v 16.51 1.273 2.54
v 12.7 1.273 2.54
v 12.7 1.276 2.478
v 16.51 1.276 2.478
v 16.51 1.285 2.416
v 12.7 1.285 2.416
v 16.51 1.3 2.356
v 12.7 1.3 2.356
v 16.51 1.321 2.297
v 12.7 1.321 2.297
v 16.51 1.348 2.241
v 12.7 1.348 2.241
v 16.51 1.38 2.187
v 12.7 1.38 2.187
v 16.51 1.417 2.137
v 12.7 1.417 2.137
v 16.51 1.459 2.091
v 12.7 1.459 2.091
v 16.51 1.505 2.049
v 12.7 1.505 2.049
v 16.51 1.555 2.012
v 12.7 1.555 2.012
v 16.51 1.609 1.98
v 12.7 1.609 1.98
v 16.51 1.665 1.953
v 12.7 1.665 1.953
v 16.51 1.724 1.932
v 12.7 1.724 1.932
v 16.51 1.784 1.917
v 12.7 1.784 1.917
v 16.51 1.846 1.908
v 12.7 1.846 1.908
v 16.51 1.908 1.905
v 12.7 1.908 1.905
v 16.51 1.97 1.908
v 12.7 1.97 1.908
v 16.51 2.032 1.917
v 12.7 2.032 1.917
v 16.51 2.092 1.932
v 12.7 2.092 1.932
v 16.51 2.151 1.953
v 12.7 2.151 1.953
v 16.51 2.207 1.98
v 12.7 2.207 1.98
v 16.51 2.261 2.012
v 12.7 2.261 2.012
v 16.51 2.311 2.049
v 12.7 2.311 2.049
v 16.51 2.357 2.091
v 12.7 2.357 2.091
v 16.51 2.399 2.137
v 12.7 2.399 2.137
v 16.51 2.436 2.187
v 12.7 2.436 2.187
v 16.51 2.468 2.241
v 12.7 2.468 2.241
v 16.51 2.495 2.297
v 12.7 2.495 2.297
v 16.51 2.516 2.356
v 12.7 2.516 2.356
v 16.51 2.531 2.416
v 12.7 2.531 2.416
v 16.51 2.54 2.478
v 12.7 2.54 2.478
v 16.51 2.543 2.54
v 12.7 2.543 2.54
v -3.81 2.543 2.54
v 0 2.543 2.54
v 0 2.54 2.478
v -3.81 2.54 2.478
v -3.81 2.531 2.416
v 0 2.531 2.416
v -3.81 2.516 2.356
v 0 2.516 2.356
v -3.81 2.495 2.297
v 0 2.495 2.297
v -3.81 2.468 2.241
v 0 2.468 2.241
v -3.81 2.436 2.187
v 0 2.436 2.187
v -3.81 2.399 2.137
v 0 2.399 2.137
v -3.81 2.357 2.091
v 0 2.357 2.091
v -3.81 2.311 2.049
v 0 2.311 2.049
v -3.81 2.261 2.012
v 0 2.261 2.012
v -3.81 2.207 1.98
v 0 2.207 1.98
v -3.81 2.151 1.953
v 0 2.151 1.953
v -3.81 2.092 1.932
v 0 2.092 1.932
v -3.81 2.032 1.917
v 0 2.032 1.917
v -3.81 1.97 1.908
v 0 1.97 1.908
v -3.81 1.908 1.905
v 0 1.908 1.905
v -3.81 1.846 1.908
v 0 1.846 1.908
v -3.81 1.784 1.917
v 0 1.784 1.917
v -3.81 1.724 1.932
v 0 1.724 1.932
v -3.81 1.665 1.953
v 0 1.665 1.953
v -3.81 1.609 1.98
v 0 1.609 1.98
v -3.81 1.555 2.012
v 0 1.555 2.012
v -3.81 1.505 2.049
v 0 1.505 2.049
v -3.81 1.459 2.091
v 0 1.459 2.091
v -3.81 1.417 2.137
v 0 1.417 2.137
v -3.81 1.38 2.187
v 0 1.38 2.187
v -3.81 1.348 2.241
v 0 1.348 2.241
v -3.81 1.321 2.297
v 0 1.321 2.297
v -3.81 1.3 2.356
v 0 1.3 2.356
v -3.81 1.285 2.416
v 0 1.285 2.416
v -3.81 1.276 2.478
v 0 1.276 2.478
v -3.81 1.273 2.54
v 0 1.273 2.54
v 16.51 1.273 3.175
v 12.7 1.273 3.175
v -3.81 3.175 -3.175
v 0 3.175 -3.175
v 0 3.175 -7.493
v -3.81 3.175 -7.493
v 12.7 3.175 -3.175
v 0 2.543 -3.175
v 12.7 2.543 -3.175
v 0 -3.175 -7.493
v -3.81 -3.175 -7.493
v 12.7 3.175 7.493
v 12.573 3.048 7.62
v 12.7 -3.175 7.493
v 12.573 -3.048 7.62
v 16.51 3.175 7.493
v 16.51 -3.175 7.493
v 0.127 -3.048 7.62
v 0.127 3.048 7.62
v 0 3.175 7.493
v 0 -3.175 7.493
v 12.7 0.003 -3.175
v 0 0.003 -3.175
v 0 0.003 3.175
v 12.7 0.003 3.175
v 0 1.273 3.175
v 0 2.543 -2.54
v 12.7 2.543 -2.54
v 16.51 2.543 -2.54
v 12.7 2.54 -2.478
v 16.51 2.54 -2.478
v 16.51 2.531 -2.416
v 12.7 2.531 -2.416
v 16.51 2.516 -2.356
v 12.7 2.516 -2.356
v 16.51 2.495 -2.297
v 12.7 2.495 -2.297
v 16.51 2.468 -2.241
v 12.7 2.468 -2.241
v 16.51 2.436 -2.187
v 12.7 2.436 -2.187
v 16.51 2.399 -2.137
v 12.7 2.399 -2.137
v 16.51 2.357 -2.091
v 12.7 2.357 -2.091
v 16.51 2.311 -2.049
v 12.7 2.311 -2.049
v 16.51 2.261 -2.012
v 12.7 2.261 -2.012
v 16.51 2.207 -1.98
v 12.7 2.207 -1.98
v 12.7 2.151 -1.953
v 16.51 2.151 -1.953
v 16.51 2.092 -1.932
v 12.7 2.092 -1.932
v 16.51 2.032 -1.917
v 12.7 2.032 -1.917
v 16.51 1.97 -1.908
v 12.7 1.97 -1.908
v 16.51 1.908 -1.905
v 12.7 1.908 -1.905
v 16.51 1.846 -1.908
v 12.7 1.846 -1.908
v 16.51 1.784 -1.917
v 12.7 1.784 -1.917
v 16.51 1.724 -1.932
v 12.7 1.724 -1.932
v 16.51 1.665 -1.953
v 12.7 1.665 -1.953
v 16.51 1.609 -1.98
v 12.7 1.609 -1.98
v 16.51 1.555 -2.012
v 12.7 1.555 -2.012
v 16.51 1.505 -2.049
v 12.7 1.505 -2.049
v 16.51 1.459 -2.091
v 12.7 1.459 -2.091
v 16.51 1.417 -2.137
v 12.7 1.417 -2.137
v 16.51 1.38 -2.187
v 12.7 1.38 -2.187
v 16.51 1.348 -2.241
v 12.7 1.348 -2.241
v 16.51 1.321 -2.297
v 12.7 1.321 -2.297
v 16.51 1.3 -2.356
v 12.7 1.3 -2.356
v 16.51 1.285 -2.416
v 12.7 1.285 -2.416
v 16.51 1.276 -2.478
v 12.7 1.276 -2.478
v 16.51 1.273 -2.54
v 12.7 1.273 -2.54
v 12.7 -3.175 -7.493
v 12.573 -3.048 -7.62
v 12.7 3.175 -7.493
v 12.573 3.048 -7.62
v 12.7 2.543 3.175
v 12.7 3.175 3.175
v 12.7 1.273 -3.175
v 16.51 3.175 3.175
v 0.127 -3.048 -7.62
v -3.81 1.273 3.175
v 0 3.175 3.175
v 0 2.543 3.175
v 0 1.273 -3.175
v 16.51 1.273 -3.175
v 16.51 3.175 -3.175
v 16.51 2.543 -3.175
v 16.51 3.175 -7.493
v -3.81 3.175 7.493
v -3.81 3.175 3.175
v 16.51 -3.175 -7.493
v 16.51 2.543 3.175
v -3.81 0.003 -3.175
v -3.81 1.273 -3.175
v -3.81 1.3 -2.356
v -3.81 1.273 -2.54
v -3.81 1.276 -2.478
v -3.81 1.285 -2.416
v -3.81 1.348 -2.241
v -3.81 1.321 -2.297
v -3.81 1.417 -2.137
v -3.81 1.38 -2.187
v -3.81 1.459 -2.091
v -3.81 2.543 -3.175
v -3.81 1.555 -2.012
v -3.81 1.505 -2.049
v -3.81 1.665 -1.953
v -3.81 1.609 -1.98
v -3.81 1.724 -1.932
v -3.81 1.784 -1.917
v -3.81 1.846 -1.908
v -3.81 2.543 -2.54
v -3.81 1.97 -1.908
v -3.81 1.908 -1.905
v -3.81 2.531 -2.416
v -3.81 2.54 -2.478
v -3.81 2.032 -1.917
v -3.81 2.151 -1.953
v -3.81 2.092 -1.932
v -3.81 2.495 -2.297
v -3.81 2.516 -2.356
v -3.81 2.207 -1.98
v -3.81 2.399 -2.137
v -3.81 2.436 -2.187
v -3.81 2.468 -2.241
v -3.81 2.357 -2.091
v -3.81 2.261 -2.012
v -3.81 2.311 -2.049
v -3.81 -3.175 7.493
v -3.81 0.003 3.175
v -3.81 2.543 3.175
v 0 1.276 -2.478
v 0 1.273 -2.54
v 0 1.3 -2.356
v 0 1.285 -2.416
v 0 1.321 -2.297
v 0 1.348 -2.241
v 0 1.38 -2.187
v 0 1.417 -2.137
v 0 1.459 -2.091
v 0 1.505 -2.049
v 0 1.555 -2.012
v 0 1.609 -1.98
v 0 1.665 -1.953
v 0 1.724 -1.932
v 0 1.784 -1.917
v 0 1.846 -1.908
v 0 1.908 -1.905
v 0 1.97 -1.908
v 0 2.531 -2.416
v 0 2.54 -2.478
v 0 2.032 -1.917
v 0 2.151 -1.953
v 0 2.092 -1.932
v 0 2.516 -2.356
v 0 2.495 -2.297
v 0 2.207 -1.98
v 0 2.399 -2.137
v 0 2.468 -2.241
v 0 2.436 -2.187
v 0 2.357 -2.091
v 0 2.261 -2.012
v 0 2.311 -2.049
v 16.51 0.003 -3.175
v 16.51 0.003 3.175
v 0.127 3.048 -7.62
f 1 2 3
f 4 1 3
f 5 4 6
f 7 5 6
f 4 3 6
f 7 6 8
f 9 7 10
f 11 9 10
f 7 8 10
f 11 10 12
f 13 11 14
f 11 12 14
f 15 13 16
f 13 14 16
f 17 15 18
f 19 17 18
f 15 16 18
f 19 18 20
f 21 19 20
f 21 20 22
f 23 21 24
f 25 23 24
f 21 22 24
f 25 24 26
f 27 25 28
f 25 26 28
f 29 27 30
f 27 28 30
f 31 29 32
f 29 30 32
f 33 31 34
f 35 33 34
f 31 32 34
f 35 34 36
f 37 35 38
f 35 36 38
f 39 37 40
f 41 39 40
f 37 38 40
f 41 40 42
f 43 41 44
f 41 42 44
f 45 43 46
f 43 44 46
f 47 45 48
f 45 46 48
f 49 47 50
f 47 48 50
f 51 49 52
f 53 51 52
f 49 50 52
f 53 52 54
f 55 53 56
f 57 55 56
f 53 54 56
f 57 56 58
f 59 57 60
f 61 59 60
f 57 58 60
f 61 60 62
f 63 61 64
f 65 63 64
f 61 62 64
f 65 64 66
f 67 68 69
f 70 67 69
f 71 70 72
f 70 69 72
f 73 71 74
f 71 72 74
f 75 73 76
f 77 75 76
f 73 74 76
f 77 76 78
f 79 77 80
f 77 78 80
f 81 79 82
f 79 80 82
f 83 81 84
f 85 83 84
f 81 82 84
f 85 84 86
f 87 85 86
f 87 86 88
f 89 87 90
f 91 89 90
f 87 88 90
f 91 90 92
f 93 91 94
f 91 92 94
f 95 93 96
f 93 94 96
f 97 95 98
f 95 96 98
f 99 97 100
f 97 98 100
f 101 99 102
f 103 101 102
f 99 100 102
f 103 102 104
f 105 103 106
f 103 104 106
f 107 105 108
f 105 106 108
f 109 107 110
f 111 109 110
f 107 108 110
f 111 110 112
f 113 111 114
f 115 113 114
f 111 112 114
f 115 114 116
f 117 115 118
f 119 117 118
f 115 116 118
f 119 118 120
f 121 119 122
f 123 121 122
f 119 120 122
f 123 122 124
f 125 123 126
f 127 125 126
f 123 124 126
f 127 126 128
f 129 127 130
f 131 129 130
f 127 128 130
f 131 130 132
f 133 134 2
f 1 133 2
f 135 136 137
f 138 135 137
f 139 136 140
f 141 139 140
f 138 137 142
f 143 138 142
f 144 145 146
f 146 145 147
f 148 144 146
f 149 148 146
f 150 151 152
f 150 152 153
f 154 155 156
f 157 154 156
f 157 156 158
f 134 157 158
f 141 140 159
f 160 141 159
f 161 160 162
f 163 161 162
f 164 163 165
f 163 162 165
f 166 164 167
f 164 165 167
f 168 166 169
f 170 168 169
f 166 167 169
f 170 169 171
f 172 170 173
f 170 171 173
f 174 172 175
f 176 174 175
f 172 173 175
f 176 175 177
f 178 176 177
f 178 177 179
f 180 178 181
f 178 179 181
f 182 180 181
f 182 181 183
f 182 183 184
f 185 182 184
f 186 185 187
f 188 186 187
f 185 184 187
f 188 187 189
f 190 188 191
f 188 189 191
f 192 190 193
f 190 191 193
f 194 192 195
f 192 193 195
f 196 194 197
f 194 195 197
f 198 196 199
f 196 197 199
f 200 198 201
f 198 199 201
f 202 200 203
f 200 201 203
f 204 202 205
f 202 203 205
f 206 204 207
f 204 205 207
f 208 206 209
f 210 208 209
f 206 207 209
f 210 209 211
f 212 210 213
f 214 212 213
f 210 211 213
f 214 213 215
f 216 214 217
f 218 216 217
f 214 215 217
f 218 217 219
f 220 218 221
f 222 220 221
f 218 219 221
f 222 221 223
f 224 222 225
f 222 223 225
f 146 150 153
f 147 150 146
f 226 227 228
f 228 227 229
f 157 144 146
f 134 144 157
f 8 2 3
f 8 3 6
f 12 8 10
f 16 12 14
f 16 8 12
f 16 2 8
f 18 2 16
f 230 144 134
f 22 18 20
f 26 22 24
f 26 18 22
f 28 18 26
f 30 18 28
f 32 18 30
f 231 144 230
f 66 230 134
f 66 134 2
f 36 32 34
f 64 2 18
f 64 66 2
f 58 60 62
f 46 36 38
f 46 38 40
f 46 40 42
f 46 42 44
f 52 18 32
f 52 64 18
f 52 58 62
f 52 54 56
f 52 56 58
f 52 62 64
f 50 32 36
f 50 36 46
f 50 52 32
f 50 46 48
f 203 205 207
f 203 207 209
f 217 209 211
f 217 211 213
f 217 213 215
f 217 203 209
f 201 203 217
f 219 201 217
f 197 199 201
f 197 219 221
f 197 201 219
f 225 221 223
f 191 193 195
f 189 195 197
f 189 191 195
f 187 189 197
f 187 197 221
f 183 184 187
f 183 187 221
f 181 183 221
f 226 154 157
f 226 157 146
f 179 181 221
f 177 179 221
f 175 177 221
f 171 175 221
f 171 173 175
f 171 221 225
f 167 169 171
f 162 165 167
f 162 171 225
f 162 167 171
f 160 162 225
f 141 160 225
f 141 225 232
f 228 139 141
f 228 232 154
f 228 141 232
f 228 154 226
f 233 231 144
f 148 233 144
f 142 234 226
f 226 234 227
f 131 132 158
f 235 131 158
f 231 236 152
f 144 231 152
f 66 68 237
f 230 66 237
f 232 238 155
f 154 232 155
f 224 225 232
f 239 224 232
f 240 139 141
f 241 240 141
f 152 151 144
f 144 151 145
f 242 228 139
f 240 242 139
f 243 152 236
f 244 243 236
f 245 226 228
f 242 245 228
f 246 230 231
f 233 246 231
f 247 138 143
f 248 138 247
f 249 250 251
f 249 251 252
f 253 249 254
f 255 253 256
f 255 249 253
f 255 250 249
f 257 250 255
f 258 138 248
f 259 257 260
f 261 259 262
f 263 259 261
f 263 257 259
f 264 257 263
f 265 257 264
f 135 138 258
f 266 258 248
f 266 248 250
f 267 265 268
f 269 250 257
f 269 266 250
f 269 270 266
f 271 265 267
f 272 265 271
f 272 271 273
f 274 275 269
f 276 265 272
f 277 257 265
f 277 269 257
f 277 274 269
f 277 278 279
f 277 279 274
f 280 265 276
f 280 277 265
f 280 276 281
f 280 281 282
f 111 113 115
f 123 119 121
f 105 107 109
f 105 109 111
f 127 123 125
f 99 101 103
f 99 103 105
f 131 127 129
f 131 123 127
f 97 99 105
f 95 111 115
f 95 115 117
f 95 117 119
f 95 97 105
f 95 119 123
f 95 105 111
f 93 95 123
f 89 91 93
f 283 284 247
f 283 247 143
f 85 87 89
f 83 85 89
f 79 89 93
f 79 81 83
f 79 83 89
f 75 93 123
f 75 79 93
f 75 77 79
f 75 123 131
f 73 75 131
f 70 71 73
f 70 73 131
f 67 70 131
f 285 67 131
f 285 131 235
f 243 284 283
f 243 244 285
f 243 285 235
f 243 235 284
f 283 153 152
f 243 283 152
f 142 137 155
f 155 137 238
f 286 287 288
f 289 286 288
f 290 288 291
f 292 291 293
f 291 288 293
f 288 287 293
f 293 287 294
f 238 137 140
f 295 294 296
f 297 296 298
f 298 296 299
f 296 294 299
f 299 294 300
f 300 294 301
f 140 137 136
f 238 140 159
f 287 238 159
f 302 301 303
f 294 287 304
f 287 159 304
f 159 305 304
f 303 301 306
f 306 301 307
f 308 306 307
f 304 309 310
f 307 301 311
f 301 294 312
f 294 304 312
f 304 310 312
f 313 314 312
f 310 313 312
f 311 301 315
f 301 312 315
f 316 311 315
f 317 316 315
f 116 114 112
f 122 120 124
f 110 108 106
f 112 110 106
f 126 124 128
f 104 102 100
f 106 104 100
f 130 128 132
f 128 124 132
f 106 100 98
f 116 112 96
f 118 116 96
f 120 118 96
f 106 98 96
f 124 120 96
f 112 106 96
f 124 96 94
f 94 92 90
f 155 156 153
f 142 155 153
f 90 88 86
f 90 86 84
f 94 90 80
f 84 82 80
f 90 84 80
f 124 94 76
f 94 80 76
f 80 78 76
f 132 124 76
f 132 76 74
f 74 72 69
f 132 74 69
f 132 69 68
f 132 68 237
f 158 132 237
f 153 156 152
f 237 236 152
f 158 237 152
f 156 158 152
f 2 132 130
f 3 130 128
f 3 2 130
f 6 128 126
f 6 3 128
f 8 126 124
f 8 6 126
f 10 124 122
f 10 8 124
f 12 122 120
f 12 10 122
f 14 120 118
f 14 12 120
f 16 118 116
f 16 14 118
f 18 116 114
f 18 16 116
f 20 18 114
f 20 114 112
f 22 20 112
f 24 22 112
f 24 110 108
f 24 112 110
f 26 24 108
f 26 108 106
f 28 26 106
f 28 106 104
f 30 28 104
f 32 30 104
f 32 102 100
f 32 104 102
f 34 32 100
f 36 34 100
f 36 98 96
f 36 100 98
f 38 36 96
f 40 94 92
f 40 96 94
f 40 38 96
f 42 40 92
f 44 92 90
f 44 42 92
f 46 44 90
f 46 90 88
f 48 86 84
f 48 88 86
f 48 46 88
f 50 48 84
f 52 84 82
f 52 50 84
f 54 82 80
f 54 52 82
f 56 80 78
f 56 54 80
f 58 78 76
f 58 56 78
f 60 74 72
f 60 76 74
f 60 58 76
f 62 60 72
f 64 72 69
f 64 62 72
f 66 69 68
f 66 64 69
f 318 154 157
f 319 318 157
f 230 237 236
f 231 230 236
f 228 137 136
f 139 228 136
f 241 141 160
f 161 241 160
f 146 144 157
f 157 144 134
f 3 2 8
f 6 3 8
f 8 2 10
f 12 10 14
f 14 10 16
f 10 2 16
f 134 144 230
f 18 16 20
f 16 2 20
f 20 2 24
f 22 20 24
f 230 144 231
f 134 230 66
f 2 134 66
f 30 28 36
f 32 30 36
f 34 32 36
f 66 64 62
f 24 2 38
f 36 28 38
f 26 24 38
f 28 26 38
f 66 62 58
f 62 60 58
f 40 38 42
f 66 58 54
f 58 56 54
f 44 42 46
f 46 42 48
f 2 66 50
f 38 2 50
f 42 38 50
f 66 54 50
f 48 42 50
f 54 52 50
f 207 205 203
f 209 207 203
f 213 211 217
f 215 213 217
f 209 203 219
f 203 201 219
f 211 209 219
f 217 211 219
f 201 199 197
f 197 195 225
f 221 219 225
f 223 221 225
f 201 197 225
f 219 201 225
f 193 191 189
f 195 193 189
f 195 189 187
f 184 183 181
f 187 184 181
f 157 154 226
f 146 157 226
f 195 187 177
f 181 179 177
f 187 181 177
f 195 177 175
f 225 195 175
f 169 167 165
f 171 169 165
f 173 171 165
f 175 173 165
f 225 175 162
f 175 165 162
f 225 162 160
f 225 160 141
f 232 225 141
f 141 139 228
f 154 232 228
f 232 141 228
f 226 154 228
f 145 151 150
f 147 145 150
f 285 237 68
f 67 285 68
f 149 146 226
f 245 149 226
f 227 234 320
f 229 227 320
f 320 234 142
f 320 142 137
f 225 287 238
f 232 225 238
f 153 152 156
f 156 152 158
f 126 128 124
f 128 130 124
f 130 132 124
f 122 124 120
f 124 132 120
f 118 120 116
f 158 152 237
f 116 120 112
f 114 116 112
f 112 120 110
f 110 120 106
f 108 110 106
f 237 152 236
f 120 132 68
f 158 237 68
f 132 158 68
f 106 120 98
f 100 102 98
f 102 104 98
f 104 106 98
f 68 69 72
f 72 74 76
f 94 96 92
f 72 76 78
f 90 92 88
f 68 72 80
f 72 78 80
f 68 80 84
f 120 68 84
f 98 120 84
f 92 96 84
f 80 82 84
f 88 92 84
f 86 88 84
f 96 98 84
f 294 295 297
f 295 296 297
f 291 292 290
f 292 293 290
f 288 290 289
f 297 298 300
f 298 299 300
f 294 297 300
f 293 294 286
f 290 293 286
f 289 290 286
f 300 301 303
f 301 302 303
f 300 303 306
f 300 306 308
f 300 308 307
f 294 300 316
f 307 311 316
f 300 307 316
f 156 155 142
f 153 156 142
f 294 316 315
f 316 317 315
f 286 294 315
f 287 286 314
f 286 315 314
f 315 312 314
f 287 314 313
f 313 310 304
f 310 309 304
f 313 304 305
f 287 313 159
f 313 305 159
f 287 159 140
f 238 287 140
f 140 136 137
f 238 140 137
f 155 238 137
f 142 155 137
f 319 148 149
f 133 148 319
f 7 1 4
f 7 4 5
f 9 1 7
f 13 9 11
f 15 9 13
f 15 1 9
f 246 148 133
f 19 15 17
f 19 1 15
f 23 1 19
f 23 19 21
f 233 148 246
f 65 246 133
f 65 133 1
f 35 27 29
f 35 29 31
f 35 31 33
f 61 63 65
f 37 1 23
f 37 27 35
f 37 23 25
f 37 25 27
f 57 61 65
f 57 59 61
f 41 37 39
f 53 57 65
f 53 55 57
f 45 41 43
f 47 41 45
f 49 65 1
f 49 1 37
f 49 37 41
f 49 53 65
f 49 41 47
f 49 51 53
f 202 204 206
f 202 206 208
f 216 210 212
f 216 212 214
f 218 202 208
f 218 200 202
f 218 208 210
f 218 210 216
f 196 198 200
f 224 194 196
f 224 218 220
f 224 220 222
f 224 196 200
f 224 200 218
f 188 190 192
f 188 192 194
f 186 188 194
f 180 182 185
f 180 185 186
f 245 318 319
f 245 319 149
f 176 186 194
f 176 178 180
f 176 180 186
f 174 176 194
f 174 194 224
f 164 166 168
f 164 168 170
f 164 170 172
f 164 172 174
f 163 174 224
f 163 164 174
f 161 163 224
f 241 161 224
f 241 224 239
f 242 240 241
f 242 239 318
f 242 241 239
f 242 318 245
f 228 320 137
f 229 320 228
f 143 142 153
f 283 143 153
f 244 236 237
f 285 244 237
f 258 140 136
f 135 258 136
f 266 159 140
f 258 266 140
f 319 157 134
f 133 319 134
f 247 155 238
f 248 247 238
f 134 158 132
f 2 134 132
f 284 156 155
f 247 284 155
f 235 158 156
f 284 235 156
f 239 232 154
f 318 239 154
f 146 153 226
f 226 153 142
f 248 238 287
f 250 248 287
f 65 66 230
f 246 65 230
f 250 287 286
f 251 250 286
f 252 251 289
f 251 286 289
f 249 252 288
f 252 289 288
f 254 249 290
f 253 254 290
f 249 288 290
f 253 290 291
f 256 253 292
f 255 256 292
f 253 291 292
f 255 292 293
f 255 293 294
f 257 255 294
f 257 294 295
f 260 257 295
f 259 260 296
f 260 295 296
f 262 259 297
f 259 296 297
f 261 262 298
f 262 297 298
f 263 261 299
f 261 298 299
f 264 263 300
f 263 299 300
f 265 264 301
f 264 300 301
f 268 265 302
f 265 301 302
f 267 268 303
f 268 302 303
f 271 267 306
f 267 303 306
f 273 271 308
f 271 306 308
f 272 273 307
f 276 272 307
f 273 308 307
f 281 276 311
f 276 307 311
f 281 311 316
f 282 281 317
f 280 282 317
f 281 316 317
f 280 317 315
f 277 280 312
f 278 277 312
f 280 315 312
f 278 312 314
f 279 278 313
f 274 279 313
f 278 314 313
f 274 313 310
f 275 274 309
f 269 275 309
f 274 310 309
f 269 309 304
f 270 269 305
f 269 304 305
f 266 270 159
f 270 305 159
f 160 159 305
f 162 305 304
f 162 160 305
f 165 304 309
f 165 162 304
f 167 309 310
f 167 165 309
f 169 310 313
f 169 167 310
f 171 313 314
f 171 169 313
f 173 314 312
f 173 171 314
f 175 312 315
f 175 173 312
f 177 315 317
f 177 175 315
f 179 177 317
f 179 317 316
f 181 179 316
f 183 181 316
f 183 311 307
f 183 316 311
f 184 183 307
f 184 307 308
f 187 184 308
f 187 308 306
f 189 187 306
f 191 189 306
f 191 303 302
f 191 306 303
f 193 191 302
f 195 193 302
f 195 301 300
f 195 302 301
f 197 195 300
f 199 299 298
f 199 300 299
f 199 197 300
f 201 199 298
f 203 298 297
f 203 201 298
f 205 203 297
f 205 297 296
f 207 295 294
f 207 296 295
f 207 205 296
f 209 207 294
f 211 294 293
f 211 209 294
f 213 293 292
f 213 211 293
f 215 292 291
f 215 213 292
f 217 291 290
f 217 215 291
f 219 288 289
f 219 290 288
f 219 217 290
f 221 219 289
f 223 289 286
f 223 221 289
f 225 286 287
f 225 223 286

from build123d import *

# Parameters (mm, degrees)
BOSS_EXTRUDE1_DEPTH = 12.7
FILLET1_RADIUS      = 0.635
FILLET1_LENGTH      = 12.7
FILLET2_RADIUS      = 0.635
FILLET2_LENGTH      = 12.7
CHAMFER1_SIZE       = 0.127
BOSS_EXTRUDE2_DEPTH = 3.81
BOSS_EXTRUDE3_DEPTH = 3.81


with BuildPart() as part:
    # Sketch1 → Boss-Extrude1 (new body)
    with BuildSketch(Plane(origin=(0, 0, 0), x_dir=(0, 0, -1), z_dir=(1, 0, 0))):
        Polygon((-7.62, -3.175), (7.62, -3.175), (7.62, 3.175), (3.175, 3.175), (3.175, 2.543), (1.905, 2.543), (1.905, 1.273), (3.175, 1.273), (3.175, 0.003), (-3.175, 0.003), (-3.175, 1.273), (-1.905, 1.273), (-1.905, 2.543), (-3.175, 2.543), (-3.175, 3.175), (-7.62, 3.175), align=None)
    extrude(amount=BOSS_EXTRUDE1_DEPTH)

    # Fillet1: full round fillet: the end face becomes a half cylinder, R = half its width
    fillet1_face = Plane((6.35, 1.908, -1.905), x_dir=(1, 0, 0), z_dir=(0, 0, 1))  # on the end face: x along it, z out of the body
    fillet1_slab = fillet1_face.offset(-FILLET1_RADIUS / 2) * Box(FILLET1_LENGTH, 2 * FILLET1_RADIUS, FILLET1_RADIUS, mode=Mode.PRIVATE)  # the body's end, R deep
    fillet1_round = Plane((6.35, 1.908, -2.54), x_dir=(0, 0, 1), z_dir=(1, 0, 0)) * Cylinder(FILLET1_RADIUS, FILLET1_LENGTH, mode=Mode.PRIVATE)  # its axis R under the face
    add(fillet1_slab - fillet1_round, mode=Mode.SUBTRACT)

    # Fillet2: full round fillet: the end face becomes a half cylinder, R = half its width
    fillet2_face = Plane((6.35, 1.908, 1.905), x_dir=(1, 0, 0), z_dir=(0, 0, -1))  # on the end face: x along it, z out of the body
    fillet2_slab = fillet2_face.offset(-FILLET2_RADIUS / 2) * Box(FILLET2_LENGTH, 2 * FILLET2_RADIUS, FILLET2_RADIUS, mode=Mode.PRIVATE)  # the body's end, R deep
    fillet2_round = Plane((6.35, 1.908, 2.54), x_dir=(0, 0, -1), z_dir=(1, 0, 0)) * Cylinder(FILLET2_RADIUS, FILLET2_LENGTH, mode=Mode.PRIVATE)  # its axis R under the face
    add(fillet2_slab - fillet2_round, mode=Mode.SUBTRACT)

    # Chamfer1
    chamfer1_edges = [part.edges().sort_by_distance(p)[0] for p in [
        (0, 0, -7.62),
        (0, 0, 7.62),
        (6.35, 3.175, -7.62),
        (6.35, -3.175, -7.62),
        (6.35, -3.175, 7.62),
        (6.35, 3.175, 7.62),
        (12.7, 0, 7.62),
        (12.7, 0, -7.62),
    ]]
    chamfer(chamfer1_edges, length=CHAMFER1_SIZE)


with BuildPart() as body_2:
    # Sketch2 → Boss-Extrude2 (new body)
    with BuildSketch(Plane(origin=(12.7, 0, 0), x_dir=(0, 0, -1), z_dir=(1, 0, 0))):
        with BuildLine():
            Line((-7.493, -3.175), (7.493, -3.175))
            Line((7.493, -3.175), (7.493, 3.175))
            Line((7.493, 3.175), (3.175, 3.175))
            Line((3.175, 3.175), (3.175, 2.543))
            Line((3.175, 2.543), (2.54, 2.543))
            ThreePointArc((2.54, 2.543), (1.905, 1.908), (2.54, 1.273))
            Line((2.54, 1.273), (3.175, 1.273))
            Line((3.175, 1.273), (3.175, 0.003))
            Line((3.175, 0.003), (-3.175, 0.003))
            Line((-3.175, 0.003), (-3.175, 1.273))
            Line((-3.175, 1.273), (-2.54, 1.273))
            ThreePointArc((-2.54, 1.273), (-1.905, 1.908), (-2.54, 2.543))
            Line((-2.54, 2.543), (-3.175, 2.543))
            Line((-3.175, 2.543), (-3.175, 3.175))
            Line((-3.175, 3.175), (-7.493, 3.175))
            Line((-7.493, 3.175), (-7.493, -3.175))
        make_face()
    extrude(amount=BOSS_EXTRUDE2_DEPTH)


with BuildPart() as body_3:
    # Sketch3 → Boss-Extrude3 (new body)
    with BuildSketch(Plane.ZY):
        with BuildLine():
            Line((-3.175, 3.175), (-7.493, 3.175))
            Line((-7.493, 3.175), (-7.493, -3.175))
            Line((-7.493, -3.175), (7.493, -3.175))
            Line((7.493, -3.175), (7.493, 3.175))
            Line((7.493, 3.175), (3.175, 3.175))
            Line((3.175, 3.175), (3.175, 2.543))
            Line((3.175, 2.543), (2.54, 2.543))
            ThreePointArc((2.54, 2.543), (1.905, 1.908), (2.54, 1.273))
            Line((2.54, 1.273), (3.175, 1.273))
            Line((3.175, 1.273), (3.175, 0.003))
            Line((3.175, 0.003), (-3.175, 0.003))
            Line((-3.175, 0.003), (-3.175, 1.273))
            Line((-3.175, 1.273), (-2.54, 1.273))
            ThreePointArc((-2.54, 1.273), (-1.905, 1.908), (-2.54, 2.543))
            Line((-2.54, 2.543), (-3.175, 2.543))
            Line((-3.175, 2.543), (-3.175, 3.175))
        make_face()
    extrude(amount=BOSS_EXTRUDE3_DEPTH)


solid = Compound([part.part, body_2.part, body_3.part])
